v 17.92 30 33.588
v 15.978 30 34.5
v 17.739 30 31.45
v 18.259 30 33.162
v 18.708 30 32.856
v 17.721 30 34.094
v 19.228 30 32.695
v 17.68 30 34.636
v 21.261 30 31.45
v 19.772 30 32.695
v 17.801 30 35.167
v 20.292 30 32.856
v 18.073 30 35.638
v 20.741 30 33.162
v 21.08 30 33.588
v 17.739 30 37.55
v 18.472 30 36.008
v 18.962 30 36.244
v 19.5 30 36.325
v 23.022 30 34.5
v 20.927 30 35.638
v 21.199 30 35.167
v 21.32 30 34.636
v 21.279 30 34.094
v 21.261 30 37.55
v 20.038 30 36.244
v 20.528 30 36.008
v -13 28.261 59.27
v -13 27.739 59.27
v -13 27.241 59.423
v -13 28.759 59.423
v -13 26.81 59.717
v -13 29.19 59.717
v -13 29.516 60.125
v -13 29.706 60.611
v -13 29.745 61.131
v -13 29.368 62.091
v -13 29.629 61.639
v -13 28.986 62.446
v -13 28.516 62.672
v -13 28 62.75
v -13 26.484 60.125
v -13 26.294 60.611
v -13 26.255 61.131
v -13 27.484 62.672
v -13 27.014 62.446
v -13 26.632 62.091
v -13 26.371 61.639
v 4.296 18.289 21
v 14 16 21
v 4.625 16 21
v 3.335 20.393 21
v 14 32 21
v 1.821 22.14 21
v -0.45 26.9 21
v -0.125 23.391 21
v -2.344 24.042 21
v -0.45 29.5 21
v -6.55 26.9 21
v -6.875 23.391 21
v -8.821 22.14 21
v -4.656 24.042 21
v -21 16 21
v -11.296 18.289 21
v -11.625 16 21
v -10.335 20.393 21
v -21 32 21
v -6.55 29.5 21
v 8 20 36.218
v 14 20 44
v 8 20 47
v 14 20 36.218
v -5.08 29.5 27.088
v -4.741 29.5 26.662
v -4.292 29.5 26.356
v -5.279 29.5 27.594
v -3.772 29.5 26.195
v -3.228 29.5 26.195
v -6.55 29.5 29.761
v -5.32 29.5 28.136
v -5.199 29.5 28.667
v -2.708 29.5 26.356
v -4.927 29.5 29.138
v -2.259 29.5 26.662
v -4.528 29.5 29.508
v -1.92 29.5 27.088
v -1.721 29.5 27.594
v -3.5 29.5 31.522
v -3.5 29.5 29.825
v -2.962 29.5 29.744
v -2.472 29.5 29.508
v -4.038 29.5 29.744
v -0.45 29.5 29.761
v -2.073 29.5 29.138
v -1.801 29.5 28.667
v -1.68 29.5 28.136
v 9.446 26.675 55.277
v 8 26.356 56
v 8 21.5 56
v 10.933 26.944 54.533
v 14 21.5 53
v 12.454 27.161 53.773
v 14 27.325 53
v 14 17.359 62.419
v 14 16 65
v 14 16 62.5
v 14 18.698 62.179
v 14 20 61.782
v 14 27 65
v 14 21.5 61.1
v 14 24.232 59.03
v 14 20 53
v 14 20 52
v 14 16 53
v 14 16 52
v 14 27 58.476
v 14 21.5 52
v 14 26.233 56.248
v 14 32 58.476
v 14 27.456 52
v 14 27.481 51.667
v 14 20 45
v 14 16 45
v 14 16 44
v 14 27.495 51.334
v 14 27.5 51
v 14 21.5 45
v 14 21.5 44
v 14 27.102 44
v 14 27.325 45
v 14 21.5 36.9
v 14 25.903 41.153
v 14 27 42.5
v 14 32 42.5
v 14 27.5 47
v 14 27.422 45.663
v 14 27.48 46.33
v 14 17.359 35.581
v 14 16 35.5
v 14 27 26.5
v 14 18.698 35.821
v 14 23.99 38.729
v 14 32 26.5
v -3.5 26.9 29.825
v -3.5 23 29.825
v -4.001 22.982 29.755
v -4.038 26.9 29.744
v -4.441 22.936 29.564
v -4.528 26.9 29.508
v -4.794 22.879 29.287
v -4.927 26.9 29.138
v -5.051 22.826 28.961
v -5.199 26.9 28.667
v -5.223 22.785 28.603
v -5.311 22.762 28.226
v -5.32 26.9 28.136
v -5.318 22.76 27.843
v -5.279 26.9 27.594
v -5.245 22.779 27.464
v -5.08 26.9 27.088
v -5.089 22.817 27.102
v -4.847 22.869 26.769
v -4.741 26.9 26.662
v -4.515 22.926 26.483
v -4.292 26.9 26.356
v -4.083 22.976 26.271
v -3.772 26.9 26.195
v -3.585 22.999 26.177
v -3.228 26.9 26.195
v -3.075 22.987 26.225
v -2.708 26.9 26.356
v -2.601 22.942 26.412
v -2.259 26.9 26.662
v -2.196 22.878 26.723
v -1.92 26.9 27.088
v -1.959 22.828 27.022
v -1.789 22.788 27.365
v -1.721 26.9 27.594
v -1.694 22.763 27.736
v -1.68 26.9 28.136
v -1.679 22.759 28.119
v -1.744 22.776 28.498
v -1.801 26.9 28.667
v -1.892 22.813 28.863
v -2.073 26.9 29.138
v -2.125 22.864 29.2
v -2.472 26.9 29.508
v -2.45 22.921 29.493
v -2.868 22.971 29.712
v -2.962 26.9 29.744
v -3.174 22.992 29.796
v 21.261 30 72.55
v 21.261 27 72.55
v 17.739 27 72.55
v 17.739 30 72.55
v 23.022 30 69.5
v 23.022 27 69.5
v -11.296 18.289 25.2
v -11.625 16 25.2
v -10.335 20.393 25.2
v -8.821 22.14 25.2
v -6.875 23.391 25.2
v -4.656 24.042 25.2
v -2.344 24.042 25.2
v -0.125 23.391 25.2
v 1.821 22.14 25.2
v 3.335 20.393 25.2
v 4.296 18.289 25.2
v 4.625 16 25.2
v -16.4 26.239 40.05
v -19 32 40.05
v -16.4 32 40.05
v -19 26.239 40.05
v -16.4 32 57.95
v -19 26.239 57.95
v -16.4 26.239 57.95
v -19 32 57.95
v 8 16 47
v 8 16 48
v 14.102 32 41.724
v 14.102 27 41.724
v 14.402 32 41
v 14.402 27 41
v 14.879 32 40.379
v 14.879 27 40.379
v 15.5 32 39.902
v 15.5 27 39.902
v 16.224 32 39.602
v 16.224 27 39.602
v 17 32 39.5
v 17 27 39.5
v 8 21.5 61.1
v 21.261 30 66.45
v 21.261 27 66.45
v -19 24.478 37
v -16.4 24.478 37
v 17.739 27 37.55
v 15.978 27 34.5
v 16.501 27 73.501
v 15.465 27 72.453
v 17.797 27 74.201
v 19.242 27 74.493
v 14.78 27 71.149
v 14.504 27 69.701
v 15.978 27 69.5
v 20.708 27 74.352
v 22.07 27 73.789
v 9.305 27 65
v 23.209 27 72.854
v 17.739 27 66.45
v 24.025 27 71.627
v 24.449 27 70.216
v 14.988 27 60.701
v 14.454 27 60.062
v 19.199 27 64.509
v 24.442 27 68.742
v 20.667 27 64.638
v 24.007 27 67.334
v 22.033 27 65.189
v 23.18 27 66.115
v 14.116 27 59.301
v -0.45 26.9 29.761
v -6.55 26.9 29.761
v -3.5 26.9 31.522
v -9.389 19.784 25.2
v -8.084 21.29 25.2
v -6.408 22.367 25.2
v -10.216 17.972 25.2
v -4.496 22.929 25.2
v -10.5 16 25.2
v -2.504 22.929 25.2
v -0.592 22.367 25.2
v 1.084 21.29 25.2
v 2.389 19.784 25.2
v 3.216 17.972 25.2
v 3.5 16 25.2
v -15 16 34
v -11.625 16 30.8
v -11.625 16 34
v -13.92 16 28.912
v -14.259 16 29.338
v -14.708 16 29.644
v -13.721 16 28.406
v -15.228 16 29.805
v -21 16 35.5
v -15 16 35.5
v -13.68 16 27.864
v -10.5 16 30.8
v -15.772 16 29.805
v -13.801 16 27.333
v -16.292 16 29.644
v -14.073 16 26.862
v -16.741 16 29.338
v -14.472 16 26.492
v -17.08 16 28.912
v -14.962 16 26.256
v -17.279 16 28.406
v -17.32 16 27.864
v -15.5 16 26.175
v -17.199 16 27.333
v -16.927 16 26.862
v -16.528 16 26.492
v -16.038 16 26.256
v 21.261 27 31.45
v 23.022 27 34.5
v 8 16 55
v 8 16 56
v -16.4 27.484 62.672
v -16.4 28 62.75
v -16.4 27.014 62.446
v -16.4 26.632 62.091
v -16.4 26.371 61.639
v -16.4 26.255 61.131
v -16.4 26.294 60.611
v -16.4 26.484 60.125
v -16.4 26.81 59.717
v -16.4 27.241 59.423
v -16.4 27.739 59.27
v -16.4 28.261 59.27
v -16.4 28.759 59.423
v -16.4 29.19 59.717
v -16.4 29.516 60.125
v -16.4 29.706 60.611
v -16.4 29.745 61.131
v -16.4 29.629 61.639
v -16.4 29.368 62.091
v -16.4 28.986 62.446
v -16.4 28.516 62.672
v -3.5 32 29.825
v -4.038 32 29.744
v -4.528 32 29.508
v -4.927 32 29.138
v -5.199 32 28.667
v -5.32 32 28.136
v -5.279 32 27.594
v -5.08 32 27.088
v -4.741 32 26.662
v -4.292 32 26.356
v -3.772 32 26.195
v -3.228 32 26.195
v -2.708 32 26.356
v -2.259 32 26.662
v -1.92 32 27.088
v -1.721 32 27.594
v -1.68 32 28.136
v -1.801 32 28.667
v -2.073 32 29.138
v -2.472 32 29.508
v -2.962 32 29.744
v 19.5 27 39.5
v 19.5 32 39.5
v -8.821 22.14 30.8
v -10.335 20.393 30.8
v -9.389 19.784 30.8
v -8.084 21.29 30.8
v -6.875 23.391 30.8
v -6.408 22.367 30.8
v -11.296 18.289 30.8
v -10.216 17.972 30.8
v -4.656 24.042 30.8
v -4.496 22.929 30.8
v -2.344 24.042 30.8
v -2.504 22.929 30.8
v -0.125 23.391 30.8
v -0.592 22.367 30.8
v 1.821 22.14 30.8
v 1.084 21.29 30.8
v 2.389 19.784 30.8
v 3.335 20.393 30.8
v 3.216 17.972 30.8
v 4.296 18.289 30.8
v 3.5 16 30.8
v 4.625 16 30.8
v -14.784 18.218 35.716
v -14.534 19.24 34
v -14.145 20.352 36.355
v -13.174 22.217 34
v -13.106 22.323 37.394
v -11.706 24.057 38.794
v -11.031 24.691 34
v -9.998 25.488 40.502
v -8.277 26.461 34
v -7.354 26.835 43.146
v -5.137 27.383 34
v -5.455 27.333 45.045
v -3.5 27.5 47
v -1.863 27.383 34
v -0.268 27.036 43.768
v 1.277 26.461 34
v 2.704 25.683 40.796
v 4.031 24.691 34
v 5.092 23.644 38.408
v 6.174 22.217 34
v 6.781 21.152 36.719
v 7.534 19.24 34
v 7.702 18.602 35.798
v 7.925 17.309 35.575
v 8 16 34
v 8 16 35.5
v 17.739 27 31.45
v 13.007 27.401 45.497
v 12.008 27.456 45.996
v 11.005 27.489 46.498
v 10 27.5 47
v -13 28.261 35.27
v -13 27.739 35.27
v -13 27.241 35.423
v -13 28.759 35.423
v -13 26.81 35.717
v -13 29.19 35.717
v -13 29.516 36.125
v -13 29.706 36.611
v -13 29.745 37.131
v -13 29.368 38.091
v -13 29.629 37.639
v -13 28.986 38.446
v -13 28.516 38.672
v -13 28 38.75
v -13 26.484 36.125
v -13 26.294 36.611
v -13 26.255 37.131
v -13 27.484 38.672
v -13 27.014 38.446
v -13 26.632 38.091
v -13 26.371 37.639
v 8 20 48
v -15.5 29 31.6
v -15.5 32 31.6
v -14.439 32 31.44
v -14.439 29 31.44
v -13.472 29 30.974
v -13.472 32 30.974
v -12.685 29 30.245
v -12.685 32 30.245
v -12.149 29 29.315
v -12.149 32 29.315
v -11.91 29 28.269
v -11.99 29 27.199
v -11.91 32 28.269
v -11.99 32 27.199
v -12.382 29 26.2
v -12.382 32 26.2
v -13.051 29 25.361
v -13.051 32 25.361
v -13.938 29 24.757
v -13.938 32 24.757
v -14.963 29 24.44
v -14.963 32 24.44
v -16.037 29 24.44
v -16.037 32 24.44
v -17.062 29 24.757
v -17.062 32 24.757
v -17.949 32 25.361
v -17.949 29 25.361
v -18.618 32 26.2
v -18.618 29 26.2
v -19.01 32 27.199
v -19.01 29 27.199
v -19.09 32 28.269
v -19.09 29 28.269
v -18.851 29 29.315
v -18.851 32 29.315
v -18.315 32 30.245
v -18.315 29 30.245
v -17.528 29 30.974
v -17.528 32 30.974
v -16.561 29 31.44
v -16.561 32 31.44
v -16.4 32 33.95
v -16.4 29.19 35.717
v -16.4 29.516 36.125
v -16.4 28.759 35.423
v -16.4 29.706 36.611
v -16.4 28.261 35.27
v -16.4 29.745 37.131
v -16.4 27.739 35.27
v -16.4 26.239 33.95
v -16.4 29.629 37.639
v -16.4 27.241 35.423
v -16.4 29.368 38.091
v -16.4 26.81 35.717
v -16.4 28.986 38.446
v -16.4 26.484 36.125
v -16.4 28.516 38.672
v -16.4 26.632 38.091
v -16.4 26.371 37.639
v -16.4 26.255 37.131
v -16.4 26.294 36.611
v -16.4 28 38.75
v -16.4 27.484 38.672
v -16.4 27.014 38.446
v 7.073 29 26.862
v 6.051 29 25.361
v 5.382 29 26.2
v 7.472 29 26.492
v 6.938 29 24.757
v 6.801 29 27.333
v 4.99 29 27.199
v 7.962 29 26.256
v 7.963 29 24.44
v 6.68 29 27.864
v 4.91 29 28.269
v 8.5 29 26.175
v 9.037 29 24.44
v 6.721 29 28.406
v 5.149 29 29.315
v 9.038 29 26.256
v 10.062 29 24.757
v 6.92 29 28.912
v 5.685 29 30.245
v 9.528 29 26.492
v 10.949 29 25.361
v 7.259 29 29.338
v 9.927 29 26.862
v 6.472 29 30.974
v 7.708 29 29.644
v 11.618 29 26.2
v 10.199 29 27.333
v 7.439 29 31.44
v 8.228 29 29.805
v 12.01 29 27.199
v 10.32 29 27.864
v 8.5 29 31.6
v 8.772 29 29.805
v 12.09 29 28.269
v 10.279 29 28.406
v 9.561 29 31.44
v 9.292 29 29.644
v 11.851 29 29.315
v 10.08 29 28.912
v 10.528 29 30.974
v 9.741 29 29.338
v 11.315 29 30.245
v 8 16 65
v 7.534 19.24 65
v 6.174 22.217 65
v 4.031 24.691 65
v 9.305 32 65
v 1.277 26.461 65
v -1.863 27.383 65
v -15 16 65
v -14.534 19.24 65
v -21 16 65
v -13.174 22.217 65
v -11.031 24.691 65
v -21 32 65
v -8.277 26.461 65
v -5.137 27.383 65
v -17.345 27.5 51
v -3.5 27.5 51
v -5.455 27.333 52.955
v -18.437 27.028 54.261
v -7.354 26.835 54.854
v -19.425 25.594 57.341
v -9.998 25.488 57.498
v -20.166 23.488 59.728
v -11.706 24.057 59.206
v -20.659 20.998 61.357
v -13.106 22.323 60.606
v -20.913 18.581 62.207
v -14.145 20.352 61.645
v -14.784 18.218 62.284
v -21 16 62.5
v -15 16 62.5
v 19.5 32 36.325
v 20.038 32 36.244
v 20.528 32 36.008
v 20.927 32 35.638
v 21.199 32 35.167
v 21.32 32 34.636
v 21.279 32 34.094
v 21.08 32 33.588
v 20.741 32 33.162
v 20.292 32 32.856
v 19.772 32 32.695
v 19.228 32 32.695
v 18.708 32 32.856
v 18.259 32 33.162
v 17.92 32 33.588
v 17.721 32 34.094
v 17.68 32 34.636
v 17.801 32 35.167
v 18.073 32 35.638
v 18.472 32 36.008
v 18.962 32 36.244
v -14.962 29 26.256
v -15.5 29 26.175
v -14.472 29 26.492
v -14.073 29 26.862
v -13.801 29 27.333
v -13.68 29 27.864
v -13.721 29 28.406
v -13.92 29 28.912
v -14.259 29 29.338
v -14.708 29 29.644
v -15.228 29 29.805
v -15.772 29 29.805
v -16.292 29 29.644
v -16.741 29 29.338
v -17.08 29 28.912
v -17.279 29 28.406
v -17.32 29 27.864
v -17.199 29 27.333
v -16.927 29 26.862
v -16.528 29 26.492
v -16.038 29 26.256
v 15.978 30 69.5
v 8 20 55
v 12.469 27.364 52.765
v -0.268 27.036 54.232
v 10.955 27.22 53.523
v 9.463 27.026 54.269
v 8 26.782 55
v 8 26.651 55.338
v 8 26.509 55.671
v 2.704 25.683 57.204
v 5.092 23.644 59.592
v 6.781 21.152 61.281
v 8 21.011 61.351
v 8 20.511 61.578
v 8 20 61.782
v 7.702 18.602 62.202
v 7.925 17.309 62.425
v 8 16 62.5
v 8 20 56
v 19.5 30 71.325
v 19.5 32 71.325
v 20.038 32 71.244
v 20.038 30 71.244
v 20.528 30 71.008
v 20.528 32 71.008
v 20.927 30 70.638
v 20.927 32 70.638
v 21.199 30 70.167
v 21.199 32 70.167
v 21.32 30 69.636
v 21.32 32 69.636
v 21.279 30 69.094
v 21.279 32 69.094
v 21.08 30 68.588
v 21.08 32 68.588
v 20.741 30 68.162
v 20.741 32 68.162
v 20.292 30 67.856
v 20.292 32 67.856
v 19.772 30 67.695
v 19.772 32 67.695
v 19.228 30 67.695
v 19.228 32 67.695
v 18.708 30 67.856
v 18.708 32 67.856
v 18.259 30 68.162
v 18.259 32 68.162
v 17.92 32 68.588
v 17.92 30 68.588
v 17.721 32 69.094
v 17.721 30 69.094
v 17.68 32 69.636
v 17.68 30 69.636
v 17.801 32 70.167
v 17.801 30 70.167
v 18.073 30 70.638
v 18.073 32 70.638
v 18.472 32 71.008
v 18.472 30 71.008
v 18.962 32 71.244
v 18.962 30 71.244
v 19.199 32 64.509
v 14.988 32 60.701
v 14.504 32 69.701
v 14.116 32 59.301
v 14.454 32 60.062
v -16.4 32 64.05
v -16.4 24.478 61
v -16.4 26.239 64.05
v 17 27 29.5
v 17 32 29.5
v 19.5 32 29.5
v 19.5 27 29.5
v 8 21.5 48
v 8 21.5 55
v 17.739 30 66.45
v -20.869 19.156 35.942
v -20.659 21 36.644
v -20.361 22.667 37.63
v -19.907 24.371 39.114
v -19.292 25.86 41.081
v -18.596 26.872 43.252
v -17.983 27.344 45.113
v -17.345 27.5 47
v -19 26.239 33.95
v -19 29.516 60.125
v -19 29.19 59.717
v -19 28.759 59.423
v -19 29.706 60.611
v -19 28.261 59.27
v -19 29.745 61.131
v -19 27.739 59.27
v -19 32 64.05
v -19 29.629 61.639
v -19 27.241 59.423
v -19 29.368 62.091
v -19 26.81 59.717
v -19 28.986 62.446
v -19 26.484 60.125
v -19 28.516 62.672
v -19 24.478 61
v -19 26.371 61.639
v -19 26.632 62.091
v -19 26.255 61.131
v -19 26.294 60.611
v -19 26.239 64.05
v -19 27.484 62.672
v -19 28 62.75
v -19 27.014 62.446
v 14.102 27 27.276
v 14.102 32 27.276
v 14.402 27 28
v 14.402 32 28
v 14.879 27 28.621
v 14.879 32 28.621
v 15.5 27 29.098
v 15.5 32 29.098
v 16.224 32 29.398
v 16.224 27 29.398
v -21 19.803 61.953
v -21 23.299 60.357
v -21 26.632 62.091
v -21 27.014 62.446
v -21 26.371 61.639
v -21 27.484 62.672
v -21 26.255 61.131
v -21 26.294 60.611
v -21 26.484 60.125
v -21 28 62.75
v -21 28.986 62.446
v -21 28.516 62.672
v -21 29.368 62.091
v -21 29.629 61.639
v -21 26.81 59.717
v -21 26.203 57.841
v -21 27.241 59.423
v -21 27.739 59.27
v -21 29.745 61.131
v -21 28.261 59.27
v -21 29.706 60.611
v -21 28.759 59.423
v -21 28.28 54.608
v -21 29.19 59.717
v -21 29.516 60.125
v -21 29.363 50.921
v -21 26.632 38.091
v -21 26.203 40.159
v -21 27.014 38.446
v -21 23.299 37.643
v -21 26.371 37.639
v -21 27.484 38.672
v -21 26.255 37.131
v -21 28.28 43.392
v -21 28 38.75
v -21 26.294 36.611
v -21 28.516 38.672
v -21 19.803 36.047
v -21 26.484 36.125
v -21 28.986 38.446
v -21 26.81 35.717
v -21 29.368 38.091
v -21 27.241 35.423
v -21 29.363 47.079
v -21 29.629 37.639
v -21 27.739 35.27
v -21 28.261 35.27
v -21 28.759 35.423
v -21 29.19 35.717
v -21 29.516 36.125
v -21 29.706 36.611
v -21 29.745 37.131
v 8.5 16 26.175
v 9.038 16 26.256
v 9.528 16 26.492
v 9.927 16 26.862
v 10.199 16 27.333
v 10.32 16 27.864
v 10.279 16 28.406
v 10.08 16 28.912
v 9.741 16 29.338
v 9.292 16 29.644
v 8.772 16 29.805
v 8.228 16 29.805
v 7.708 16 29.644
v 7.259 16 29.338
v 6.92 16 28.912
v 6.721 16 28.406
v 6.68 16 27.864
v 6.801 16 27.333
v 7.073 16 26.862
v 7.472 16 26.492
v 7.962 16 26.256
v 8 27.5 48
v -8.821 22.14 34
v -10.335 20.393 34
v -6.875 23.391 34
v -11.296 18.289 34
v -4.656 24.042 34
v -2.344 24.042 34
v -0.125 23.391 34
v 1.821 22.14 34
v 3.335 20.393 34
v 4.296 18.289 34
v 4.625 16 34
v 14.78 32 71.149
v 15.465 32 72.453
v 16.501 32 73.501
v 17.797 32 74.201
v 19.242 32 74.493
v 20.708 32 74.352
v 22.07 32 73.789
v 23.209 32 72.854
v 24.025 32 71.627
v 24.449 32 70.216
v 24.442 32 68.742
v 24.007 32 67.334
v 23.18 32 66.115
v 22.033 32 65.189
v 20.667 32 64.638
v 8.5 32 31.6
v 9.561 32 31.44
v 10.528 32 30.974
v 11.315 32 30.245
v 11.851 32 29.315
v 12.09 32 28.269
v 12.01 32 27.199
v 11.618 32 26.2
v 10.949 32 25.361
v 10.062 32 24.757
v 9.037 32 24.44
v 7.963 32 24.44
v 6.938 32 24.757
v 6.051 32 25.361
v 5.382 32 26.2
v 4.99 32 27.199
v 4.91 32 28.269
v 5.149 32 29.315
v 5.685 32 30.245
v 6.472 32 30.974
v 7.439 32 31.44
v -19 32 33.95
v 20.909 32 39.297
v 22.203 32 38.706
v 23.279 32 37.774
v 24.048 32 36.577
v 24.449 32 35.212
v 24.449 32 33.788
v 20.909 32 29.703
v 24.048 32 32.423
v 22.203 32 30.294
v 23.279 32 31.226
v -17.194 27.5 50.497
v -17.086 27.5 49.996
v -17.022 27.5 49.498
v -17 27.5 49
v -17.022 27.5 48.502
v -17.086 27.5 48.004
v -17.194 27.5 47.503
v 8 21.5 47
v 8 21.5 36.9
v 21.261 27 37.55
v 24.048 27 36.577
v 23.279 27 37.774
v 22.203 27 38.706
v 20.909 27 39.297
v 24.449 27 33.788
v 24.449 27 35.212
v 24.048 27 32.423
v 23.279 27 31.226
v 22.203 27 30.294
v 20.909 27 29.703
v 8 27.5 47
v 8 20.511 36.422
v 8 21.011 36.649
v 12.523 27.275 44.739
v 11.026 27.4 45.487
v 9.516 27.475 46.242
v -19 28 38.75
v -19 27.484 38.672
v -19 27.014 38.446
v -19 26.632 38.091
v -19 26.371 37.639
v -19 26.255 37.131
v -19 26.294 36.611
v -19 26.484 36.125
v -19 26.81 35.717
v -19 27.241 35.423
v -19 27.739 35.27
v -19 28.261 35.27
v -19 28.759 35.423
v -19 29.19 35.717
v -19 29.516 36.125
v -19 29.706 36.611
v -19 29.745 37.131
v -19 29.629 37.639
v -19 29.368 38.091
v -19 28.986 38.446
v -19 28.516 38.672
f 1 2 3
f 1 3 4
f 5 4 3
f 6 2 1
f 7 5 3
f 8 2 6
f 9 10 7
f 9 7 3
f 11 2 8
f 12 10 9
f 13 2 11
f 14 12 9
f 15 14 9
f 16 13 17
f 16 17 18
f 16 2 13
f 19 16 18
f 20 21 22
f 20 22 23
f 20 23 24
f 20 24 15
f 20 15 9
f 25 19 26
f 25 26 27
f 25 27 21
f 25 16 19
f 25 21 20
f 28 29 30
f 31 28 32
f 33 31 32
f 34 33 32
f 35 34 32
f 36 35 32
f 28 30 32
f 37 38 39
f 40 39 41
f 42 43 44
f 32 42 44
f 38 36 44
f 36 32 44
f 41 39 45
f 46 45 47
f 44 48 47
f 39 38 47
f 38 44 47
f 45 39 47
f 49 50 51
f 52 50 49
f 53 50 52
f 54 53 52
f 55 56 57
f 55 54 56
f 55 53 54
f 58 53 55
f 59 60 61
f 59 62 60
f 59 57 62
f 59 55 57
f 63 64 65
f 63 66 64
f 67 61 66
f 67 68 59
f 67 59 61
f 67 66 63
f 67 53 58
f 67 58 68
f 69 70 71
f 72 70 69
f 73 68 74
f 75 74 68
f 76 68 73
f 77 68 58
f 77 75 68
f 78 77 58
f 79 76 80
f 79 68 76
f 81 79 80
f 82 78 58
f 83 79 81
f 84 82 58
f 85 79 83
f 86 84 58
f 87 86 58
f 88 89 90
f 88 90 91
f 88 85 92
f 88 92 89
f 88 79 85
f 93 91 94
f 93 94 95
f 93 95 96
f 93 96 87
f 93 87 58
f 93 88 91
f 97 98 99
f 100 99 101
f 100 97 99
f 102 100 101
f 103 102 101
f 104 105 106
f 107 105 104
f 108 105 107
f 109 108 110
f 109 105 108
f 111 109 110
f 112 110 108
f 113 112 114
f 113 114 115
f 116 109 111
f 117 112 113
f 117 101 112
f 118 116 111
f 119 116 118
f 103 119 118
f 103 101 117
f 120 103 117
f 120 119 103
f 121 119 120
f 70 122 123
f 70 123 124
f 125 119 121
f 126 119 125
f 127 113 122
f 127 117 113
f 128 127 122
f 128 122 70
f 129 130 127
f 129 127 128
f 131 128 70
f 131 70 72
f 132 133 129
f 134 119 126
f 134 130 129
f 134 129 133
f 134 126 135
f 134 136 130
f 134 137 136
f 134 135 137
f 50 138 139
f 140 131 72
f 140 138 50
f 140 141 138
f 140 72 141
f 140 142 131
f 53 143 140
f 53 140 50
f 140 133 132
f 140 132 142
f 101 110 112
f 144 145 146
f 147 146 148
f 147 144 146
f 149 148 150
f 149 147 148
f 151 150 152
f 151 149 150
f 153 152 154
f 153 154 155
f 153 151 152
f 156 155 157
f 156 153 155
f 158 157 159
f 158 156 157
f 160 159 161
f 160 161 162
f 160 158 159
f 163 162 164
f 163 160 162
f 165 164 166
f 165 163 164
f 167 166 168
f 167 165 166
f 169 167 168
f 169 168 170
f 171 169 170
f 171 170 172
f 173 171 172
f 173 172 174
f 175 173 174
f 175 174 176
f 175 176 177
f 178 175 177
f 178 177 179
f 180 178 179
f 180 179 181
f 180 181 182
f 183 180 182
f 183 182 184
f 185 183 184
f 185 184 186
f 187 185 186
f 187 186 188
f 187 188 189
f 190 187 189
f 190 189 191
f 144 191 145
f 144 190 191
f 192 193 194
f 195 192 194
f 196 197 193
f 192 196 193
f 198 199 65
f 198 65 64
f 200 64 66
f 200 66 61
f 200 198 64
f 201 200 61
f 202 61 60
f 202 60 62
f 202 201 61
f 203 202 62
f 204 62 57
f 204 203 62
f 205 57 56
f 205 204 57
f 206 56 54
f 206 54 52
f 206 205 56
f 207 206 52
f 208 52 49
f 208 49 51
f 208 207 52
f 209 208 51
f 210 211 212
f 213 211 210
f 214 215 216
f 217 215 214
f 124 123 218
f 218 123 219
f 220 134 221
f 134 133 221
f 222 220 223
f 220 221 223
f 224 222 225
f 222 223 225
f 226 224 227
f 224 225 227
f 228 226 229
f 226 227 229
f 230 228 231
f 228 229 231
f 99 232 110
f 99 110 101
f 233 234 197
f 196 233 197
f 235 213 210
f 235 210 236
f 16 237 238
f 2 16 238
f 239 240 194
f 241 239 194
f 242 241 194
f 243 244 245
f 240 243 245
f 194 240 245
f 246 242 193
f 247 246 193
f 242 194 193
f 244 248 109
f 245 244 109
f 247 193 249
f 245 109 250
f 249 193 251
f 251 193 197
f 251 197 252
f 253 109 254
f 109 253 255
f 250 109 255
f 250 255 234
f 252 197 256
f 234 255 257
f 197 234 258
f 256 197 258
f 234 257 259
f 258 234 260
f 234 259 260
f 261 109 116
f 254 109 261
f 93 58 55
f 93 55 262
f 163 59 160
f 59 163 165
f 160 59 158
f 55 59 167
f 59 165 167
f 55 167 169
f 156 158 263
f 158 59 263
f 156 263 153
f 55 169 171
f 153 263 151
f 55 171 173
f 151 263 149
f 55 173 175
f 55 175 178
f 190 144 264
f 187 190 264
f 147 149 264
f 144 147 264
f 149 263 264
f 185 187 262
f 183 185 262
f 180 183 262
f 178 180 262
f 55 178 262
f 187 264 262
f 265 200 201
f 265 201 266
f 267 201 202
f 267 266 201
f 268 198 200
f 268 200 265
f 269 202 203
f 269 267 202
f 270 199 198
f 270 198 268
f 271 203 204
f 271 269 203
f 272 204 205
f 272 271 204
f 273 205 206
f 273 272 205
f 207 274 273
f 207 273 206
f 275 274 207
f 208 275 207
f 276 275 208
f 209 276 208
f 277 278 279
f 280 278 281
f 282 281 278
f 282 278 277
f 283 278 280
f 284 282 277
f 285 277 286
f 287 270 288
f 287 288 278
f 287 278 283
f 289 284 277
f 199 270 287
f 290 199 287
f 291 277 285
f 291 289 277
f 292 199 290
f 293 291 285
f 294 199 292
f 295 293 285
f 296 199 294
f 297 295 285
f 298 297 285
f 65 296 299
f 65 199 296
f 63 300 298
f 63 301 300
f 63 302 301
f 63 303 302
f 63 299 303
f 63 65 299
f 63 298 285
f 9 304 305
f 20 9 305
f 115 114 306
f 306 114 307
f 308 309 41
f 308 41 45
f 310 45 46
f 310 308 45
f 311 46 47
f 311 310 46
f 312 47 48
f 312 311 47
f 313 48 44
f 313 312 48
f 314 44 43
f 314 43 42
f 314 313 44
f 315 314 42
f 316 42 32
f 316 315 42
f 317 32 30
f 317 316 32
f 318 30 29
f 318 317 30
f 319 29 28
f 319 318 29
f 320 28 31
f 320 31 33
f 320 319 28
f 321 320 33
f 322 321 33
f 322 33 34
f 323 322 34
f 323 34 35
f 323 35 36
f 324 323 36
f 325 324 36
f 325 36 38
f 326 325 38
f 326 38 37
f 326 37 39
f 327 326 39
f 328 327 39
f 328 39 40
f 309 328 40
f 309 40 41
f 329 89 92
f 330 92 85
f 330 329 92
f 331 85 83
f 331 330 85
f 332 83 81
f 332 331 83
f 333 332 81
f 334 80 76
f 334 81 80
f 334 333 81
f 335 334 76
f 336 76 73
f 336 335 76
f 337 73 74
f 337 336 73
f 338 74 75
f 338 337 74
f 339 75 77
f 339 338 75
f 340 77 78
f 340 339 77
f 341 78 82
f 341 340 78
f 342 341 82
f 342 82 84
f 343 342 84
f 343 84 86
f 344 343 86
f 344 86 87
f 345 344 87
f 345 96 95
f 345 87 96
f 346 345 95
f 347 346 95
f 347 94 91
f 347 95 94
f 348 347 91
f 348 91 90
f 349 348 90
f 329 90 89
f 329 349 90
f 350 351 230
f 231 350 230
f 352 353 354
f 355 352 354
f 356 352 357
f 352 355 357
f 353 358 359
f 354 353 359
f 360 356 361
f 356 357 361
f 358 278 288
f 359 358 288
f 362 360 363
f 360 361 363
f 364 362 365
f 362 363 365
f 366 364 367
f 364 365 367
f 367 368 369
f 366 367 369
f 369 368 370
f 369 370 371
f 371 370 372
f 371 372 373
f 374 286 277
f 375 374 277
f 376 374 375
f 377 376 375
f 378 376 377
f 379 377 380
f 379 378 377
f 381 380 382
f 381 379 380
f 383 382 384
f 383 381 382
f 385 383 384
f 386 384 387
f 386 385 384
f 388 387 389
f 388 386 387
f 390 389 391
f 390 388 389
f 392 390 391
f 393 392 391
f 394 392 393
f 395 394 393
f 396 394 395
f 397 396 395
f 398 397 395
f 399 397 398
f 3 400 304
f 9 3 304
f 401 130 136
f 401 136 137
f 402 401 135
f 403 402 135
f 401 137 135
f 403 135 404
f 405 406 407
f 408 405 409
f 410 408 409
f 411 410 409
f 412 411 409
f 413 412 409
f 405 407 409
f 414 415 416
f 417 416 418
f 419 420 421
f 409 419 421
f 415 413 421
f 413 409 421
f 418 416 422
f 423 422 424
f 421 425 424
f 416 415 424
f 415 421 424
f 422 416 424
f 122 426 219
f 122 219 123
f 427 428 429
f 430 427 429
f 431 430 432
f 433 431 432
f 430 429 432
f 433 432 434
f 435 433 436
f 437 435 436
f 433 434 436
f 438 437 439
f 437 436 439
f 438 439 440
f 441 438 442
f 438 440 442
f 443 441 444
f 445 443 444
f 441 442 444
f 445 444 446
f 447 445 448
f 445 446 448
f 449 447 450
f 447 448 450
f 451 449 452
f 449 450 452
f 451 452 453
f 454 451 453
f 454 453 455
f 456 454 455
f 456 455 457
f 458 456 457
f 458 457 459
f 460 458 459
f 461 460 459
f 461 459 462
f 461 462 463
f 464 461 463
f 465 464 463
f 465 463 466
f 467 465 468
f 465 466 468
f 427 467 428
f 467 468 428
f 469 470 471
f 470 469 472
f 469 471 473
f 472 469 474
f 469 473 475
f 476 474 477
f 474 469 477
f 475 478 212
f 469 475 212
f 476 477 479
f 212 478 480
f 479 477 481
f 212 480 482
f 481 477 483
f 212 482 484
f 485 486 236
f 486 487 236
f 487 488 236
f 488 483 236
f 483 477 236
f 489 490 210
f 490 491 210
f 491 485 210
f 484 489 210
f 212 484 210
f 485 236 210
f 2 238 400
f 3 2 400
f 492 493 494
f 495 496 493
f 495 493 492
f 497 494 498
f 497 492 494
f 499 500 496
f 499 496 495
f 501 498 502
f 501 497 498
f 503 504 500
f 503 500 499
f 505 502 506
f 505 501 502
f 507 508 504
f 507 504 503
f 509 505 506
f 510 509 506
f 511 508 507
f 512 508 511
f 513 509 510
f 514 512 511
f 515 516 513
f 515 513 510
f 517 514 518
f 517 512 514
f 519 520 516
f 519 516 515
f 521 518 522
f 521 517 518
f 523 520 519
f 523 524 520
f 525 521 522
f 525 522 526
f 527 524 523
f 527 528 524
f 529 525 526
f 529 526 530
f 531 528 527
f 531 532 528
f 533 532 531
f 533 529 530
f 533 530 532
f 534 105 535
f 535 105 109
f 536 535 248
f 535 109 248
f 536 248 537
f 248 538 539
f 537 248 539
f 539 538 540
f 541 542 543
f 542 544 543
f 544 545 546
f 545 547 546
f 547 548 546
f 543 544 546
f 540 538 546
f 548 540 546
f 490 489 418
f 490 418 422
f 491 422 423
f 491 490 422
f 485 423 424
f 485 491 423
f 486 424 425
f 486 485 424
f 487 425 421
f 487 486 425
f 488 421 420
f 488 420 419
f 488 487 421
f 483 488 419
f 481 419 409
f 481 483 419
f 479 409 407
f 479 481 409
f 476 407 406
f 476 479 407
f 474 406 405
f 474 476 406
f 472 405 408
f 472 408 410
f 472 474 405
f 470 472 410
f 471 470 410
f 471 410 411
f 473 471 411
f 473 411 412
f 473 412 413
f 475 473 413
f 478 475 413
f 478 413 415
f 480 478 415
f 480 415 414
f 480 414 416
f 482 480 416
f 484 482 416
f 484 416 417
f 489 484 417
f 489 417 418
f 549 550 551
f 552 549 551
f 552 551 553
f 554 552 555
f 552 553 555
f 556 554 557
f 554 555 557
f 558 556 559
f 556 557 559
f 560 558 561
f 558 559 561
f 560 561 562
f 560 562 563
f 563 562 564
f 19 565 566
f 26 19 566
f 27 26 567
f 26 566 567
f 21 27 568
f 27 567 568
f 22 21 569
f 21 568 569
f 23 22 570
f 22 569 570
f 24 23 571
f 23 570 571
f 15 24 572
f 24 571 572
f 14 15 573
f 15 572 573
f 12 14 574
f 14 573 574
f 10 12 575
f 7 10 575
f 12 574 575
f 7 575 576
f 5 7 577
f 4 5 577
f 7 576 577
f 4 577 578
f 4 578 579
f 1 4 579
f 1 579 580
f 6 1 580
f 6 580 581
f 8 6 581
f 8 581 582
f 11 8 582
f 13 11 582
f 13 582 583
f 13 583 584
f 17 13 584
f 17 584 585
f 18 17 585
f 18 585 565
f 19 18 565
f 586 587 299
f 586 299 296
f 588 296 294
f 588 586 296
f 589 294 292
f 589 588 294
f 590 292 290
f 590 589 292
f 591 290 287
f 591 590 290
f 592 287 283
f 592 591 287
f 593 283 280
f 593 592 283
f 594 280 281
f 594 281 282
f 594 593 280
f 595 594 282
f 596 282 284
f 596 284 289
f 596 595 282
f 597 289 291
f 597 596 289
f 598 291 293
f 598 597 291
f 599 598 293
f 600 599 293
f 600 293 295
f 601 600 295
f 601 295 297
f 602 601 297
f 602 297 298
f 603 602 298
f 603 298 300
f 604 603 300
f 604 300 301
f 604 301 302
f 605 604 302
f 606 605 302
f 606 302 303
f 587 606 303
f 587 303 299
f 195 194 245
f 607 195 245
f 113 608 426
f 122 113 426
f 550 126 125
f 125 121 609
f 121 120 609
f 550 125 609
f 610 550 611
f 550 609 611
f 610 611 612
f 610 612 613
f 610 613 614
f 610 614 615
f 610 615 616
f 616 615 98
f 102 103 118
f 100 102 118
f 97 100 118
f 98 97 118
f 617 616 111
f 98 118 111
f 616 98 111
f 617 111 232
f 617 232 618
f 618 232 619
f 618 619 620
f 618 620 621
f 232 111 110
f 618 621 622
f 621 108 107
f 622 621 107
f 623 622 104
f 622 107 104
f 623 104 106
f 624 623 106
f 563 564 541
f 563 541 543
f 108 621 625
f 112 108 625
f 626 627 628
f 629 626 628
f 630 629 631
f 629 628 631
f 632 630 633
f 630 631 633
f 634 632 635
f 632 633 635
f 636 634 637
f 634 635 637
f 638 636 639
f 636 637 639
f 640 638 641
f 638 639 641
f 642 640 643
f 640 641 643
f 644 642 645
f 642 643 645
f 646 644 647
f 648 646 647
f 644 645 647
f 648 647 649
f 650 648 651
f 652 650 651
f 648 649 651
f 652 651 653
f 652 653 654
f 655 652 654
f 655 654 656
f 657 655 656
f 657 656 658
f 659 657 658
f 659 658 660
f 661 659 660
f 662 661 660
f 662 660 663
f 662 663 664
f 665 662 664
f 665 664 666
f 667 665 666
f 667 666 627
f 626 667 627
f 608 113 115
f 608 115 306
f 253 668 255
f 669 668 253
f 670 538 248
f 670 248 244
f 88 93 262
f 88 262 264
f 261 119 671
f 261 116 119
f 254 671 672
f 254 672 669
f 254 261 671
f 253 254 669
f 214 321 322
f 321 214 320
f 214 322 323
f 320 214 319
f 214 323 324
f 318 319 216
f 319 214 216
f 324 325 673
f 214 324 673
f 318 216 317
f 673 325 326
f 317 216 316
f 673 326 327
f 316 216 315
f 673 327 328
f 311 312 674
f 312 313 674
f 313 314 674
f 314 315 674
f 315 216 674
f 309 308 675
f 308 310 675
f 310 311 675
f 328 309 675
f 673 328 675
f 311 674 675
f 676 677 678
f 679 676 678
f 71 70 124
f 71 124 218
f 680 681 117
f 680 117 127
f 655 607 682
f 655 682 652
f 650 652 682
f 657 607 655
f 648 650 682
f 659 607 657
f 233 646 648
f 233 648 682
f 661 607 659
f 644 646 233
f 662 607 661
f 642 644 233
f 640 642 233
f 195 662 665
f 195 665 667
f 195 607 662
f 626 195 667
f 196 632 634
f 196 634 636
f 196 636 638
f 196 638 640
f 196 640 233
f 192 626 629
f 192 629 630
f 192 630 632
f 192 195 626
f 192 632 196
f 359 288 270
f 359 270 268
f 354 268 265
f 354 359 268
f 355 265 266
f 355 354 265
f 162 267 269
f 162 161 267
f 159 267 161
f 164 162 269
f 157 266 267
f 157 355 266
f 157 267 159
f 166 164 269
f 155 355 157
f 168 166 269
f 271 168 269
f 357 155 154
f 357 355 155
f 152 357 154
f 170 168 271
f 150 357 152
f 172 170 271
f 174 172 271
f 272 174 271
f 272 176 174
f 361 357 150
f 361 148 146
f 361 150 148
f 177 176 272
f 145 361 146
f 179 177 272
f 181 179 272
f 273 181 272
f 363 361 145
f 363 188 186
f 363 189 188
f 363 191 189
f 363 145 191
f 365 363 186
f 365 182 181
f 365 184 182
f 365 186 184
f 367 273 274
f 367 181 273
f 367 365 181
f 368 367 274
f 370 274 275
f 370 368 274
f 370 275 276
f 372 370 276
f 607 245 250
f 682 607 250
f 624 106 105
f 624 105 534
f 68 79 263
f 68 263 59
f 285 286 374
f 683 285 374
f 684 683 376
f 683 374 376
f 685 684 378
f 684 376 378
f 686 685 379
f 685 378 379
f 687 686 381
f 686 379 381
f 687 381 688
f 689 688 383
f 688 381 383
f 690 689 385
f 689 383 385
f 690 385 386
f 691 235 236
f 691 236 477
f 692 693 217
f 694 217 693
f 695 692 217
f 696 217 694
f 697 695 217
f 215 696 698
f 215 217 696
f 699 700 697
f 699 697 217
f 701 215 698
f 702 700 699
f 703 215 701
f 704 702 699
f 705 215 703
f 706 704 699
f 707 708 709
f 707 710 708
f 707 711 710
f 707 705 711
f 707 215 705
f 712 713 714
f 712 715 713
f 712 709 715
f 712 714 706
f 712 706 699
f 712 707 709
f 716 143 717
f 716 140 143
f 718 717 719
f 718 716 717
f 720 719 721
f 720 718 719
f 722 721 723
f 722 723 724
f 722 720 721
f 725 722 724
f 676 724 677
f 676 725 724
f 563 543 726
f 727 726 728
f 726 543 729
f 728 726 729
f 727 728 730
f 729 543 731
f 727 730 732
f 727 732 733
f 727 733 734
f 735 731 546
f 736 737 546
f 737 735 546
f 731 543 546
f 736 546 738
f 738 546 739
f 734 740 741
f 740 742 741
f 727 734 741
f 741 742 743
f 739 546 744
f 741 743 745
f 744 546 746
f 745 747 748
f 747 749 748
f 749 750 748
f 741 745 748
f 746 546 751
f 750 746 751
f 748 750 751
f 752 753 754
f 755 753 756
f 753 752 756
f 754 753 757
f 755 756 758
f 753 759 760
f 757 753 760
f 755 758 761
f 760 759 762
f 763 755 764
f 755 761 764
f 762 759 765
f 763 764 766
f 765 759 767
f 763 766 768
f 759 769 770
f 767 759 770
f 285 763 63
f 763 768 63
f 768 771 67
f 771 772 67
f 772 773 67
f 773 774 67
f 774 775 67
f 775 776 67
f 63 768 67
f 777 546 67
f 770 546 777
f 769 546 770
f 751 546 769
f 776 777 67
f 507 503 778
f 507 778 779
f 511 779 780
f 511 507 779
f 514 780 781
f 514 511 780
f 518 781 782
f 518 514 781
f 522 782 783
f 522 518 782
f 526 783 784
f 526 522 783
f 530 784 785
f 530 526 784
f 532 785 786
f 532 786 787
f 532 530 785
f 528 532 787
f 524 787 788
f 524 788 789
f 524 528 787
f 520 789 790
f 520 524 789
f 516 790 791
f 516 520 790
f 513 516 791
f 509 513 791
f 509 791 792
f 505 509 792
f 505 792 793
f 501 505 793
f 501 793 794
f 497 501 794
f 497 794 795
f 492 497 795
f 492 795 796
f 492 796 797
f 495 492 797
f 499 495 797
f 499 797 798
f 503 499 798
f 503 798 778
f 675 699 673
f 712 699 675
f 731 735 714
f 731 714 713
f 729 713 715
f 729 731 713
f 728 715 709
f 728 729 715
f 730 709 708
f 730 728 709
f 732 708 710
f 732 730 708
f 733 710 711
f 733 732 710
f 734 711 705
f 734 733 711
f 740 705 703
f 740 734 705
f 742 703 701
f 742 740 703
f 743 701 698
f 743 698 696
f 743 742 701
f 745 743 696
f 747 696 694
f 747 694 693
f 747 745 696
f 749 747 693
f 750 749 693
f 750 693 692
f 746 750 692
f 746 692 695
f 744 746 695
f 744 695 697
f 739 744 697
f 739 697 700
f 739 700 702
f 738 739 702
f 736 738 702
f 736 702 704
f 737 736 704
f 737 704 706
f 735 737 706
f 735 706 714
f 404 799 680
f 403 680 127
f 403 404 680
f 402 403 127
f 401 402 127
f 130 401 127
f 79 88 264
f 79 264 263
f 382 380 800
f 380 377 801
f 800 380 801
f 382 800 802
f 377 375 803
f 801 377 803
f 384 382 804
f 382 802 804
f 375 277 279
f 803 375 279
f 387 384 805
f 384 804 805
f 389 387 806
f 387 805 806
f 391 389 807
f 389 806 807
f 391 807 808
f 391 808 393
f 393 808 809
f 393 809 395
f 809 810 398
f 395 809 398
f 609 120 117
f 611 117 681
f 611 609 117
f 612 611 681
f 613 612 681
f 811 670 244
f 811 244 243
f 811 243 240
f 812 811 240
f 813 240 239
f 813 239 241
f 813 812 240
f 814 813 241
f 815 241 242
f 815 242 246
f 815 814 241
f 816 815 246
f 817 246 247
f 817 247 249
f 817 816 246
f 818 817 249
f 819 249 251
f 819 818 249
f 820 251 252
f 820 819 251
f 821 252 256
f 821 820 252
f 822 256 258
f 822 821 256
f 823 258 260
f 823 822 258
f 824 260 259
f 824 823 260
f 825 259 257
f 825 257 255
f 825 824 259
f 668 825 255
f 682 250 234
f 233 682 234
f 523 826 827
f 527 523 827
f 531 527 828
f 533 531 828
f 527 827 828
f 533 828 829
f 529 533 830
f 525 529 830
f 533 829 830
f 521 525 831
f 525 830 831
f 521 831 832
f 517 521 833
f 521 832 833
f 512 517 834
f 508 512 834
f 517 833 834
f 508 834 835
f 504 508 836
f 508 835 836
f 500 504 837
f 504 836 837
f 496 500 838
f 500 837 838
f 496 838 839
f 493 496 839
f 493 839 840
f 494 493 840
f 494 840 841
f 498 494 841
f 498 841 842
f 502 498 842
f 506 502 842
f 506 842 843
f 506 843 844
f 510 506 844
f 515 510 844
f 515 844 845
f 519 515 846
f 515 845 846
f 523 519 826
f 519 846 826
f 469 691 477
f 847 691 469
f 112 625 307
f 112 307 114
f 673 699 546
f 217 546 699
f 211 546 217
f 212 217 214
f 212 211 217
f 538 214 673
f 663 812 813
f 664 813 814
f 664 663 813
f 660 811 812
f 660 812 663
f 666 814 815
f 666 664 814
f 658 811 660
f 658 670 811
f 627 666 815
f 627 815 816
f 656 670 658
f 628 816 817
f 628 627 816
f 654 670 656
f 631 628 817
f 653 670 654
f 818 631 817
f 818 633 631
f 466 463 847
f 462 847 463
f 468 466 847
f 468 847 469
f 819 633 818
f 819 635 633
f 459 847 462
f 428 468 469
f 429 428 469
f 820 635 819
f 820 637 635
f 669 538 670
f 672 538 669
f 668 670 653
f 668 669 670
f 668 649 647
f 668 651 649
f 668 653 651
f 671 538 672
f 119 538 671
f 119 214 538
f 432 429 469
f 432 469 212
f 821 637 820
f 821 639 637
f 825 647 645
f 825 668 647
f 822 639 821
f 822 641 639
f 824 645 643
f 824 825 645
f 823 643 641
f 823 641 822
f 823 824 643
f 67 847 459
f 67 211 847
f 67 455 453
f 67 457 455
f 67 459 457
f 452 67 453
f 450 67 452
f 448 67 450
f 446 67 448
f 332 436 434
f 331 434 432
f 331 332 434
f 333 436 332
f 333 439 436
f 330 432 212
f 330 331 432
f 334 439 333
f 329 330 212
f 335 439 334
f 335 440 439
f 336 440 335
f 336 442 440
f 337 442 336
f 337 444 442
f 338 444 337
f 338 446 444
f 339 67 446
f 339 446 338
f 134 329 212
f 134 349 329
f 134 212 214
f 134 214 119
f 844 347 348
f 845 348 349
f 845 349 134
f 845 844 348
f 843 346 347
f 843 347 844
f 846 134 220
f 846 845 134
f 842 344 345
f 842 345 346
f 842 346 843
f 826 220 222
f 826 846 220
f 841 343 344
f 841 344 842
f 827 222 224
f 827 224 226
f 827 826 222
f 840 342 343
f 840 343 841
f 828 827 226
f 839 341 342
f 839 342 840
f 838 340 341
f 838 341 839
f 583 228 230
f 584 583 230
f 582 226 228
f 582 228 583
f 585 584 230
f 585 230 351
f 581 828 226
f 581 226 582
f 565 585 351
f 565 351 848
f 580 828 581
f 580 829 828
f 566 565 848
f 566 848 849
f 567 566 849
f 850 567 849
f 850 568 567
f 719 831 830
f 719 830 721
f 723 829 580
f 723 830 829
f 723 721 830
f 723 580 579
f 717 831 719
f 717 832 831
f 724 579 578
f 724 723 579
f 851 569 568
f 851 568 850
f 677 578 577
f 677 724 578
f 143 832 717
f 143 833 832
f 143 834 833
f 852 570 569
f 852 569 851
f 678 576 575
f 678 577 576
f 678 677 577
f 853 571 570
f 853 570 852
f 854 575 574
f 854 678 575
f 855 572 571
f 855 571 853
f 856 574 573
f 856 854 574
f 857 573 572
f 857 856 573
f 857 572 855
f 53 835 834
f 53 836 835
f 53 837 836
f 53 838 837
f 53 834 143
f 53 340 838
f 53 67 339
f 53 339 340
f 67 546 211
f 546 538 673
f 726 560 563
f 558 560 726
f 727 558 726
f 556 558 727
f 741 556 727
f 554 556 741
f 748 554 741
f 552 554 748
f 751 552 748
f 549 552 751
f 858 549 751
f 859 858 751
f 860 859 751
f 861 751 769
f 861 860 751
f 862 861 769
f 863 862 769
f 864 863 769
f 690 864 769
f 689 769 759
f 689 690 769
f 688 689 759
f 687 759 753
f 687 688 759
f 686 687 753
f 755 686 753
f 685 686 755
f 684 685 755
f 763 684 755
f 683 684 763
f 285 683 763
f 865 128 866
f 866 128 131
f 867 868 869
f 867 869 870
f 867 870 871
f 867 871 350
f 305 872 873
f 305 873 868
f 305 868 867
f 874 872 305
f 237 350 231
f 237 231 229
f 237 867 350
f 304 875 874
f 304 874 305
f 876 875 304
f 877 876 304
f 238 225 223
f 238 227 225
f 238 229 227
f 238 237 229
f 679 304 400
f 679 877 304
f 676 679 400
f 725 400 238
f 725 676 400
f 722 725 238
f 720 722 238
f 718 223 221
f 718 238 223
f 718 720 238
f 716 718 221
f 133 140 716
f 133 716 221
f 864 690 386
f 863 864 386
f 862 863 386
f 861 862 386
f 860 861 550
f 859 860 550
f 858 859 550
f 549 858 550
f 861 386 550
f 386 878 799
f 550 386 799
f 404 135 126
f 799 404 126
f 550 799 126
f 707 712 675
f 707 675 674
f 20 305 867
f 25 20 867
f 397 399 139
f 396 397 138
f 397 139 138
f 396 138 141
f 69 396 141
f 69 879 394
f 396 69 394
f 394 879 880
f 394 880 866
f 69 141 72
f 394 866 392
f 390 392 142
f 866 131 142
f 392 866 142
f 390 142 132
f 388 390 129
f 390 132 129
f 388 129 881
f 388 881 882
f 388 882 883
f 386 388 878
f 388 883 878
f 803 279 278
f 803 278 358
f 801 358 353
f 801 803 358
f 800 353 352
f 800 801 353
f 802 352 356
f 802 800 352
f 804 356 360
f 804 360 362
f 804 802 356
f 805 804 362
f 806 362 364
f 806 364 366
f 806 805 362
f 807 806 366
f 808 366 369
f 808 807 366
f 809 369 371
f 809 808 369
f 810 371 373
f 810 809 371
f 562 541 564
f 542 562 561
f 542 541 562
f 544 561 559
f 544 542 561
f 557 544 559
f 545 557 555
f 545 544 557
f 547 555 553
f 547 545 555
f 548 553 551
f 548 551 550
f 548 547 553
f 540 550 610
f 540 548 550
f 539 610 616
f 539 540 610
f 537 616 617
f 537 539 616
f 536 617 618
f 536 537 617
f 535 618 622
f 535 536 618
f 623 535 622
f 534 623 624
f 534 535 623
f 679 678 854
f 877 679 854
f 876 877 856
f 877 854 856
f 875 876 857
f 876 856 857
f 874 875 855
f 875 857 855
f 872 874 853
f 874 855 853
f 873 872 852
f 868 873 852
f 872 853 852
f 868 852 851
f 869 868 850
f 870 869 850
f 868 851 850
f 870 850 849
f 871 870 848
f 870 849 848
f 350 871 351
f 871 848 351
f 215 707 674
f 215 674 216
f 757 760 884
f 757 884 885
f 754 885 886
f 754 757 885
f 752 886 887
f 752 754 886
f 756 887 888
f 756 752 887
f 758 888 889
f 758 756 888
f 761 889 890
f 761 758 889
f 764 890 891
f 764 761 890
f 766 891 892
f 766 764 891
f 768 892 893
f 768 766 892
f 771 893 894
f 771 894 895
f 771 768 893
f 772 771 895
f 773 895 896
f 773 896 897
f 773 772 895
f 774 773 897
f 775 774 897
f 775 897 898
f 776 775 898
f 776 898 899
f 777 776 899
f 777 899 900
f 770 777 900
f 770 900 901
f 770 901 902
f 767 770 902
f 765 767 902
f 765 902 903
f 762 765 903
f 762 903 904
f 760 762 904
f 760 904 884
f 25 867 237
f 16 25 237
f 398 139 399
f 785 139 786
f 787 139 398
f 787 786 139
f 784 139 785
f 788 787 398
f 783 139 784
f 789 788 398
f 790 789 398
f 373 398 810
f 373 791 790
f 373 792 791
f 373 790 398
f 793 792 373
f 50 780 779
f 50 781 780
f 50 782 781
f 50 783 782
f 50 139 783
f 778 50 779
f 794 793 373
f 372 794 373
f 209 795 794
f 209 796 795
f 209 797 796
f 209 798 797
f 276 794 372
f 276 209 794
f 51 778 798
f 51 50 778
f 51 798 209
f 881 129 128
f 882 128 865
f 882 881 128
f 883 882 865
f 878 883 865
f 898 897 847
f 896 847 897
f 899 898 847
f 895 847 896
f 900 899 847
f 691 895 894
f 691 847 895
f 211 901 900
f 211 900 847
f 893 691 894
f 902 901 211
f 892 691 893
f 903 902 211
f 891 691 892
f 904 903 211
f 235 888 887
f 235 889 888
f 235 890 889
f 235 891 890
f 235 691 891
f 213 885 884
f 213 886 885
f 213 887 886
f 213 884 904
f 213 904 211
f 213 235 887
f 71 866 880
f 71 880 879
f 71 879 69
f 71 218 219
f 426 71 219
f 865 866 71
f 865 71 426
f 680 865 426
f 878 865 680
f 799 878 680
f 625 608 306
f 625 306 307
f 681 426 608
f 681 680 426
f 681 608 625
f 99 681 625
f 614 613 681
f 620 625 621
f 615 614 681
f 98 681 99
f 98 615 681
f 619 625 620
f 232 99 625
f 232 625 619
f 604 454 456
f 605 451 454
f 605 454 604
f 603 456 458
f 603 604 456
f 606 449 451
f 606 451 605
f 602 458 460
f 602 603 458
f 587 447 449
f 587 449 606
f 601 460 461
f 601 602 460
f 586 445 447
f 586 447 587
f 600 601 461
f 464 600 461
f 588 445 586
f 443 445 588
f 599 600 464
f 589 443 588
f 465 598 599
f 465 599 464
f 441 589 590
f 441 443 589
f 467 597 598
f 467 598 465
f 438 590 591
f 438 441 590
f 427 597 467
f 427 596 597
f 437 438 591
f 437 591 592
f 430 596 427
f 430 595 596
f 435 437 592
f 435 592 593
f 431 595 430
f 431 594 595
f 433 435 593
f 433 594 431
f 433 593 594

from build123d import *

# Parameters (mm, degrees)
SKETCH12_W                = 35
SKETCH12_H                = 44
CHAMBER_DEPTH             = 16
SKETCH13_R                = 11.5
BODY_DEPTH                = 31
HOT_END_TONEL_DEPTH       = 76.538069872
SKETCH26_W                = 27
SKETCH26_H                = 1.5
GRID_V_DEPTH              = 6
GRID_H_DEPTH              = 16
SKETCH16_R                = 13.5
SKETCH18_R                = 11.5
SKETCH20_R                = 8.125
HOT_END_1_DEPTH           = 3.2
SKETCH21_R                = 7
HOT_END_2_DEPTH           = 5.6
SKETCH22_R                = 8.125
HOT_END_3_DEPTH           = 4.2
SKETCH24_R                = 1.825
MOUNT_HOLES_DEPTH         = 71.156967099
SKETCH25_R                = 1.75
FAN_MOUNT_HOLES_DEPTH     = 8
FAN_MOUNT_NUT_HOLES_START = -2
FAN_MOUNT_NUT_HOLES_DEPTH = 2.6
SKETCH32_R                = 1.825
HOT_END_SCREW_HOLE_DEPTH  = 20
HOT_END_NUT_HOLE_START    = 2.5
HOT_END_NUT_HOLE_DEPTH    = 2.6
SKETCH35_R                = 1.825
BOSS_EXTRUDE1_DEPTH       = 5
CUT_EXTRUDE5_DEPTH        = 3
SKETCH37_R                = 3.6
CUT_EXTRUDE6_DEPTH        = 3
FILLET1_R                 = 3


with BuildPart() as part:
    # Sketch12 → chamber (new body)
    with BuildSketch(Plane(origin=(0, 0, 0), x_dir=(-1, 0, 0), z_dir=(0, -1, 0))):
        with Locations((3.5, -43)):
            Rectangle(SKETCH12_W, SKETCH12_H)
    extrude(amount=-CHAMBER_DEPTH)

    # Sketch13 → body (cut)
    with BuildSketch(Plane.XY.offset(65)):
        with Locations((-3.5, 16)):
            Circle(SKETCH13_R)
    extrude(amount=-BODY_DEPTH, mode=Mode.SUBTRACT)

    # Sketch14 → hot-end-tonel (cut, through all)
    with BuildSketch(Plane(origin=(14, 0, 0), x_dir=(0, 0, -1), z_dir=(1, 0, 0))):
        with BuildLine():
            Line((-51, 27.5), (-47, 27.5))
            ThreePointArc((-47, 27.5), (-35.5, 16), (-47, 4.5))
            Line((-47, 4.5), (-51, 4.5))
            ThreePointArc((-51, 4.5), (-62.5, 16), (-51, 27.5))
        make_face()
    extrude(amount=-HOT_END_TONEL_DEPTH, mode=Mode.SUBTRACT)

    # Sketch26 → grid-v (add)
    with BuildSketch(Plane(origin=(14, 0, 0), x_dir=(0, 0, -1), z_dir=(1, 0, 0))):
        with Locations((-49, 11.25)):
            Rectangle(SKETCH26_W, SKETCH26_H)
    extrude(amount=-GRID_V_DEPTH)

    # Sketch27 → grid-h (add)
    with BuildSketch(Plane.XZ):
        Polygon((8, 56), (14, 53), (14, 52), (8, 55), align=None)
        Polygon((14, 44), (8, 47), (8, 48), (14, 45), align=None)
    extrude(amount=-GRID_H_DEPTH)

    # Sketch16 → Cut-Loft1 section 0
    with BuildSketch(Plane(origin=(-21, 0, 0), x_dir=(0, 0, -1), z_dir=(1, 0, 0))):
        with Locations((-49, 16)):
            Circle(SKETCH16_R)
    # Sketch18 → Cut-Loft1 section 1
    with BuildSketch(Plane.ZY.offset(17)):
        with Locations((49, 16)):
            Circle(SKETCH18_R)
    loft(mode=Mode.SUBTRACT)

    # Sketch20 → hot-end-1 (cut)
    with BuildSketch(Plane.XY.offset(34)):
        with Locations((-3.5, 16)):
            Circle(SKETCH20_R)
    extrude(amount=-HOT_END_1_DEPTH, mode=Mode.SUBTRACT)

    # Sketch21 → hot-end-2 (cut)
    with BuildSketch(Plane.XY.offset(30.8)):
        with Locations((-3.5, 16)):
            Circle(SKETCH21_R)
    extrude(amount=-HOT_END_2_DEPTH, mode=Mode.SUBTRACT)

    # Sketch22 → hot-end-3 (cut)
    with BuildSketch(Plane.XY.offset(25.2)):
        with Locations((-3.5, 16)):
            Circle(SKETCH22_R)
    extrude(amount=-HOT_END_3_DEPTH, mode=Mode.SUBTRACT)

    # Sketch24 → mount-holes (cut, through all)
    with BuildSketch(Plane.XZ):
        with Locations((-15.5, 28)):
            Circle(SKETCH24_R)
        with Locations((8.5, 28)):
            Circle(SKETCH24_R)
    extrude(amount=-MOUNT_HOLES_DEPTH, mode=Mode.SUBTRACT)

    # Sketch25 → fan-mount-holes (cut)
    with BuildSketch(Plane.ZY.offset(21)):
        with Locations((60.999999795, 4)):
            Circle(SKETCH25_R)
        with Locations((36.999999795, 4)):
            Circle(SKETCH25_R)
    extrude(amount=-FAN_MOUNT_HOLES_DEPTH, mode=Mode.SUBTRACT)

    # Sketch34 → fan-mount-nut-holes (cut)
    with BuildSketch(Plane.ZY.offset(21).offset(FAN_MOUNT_NUT_HOLES_START)):
        Polygon((33.949999795, 0), (40.049999795, 0), (40.049999795, 5.760918321), (36.999999795, 7.521836642), (33.949999795, 5.760918321), align=None)
        Polygon((64.049999795, 0), (64.049999795, 5.760918321), (60.999999795, 7.521836642), (57.949999795, 5.760918321), (57.949999795, 0), align=None)
    extrude(amount=-FAN_MOUNT_NUT_HOLES_DEPTH, mode=Mode.SUBTRACT)


with BuildPart() as body_2:
    # Mirror1: mirrored copy
    add(part.part.mirror(Plane.ZX.offset(16)))

    # Sketch32 → hot-end-screw-hole (cut)
    with BuildSketch(Plane(origin=(0, 32, 0), x_dir=(-1, 0, 0), z_dir=(0, -1, 0))):
        with Locations((3.5, -28)):
            Circle(SKETCH32_R)
    extrude(amount=HOT_END_SCREW_HOLE_DEPTH, mode=Mode.SUBTRACT)

    # Sketch33 → hot-end-nut-hole (cut)
    with BuildSketch(Plane.XZ.offset(-32).offset(HOT_END_NUT_HOLE_START)):
        Polygon((-6.55, 21), (-0.45, 21), (-0.45, 29.760918321), (-3.5, 31.521836642), (-6.55, 29.760918321), align=None)
    extrude(amount=HOT_END_NUT_HOLE_DEPTH, mode=Mode.SUBTRACT)

    # Sketch35 → Boss-Extrude1 (add)
    # profile 1 of 2: a face of its own
    with BuildSketch(Plane(origin=(0, 32, 0), x_dir=(1, 0, 0), z_dir=(0, 1, 0))):
        with BuildLine():
            Line((9.305077899, -65), (14.504047822, -69.701151268))
            ThreePointArc((14.504047822, -69.701151268), (23.208629379, -72.853515786), (19.198969923, -64.509070137))
            Line((19.198969923, -64.509070137), (14, -59.807918869))
            Line((14, -59.807918869), (9.305077899, -65))
        make_face()
        with Locations((19.5, -69.5)):
            Circle(SKETCH35_R, mode=Mode.SUBTRACT)
    # profile 2 of 2: a face of its own
    with BuildSketch(Plane(origin=(0, 32, 0), x_dir=(1, 0, 0), z_dir=(0, 1, 0))):
        with BuildLine():
            Line((14, -39.5), (14, -29.5))
            Line((14, -29.5), (19.5, -29.5))
            ThreePointArc((19.5, -29.5), (24.5, -34.5), (19.5, -39.5))
            Line((19.5, -39.5), (14, -39.5))
        make_face()
        with Locations((19.5, -34.5)):
            Circle(SKETCH35_R, mode=Mode.SUBTRACT)
    extrude(amount=-BOSS_EXTRUDE1_DEPTH)

    # Sketch36 → Cut-Extrude5 (cut)
    with BuildSketch(Plane.XZ.offset(-27)):
        Polygon((17.739081679, 31.45), (21.260918321, 31.45), (23.021836642, 34.5), (21.260918321, 37.55), (17.739081679, 37.55), (15.978163358, 34.5), align=None)
        Polygon((23.021836642, 69.5), (21.260918321, 72.55), (17.739081679, 72.55), (15.978163358, 69.5), (17.739081679, 66.45), (21.260918321, 66.45), align=None)
    extrude(amount=-CUT_EXTRUDE5_DEPTH, mode=Mode.SUBTRACT)

    # Sketch37 → Cut-Extrude6 (cut)
    with BuildSketch(Plane(origin=(0, 32, 0), x_dir=(1, 0, 0), z_dir=(0, 1, 0))):
        with Locations((-15.5, -28)):
            Circle(SKETCH37_R)
        with Locations((8.5, -28)):
            Circle(SKETCH37_R)
    extrude(amount=-CUT_EXTRUDE6_DEPTH, mode=Mode.SUBTRACT)

    # Fillet1
    fillet1_edges = [body_2.edges().sort_by_distance(p)[0] for p in [
        (14, 29.5, 59.807918869),
        (14, 29.5, 29.5),
        (14, 29.5, 39.5),
    ]]
    fillet(fillet1_edges, radius=FILLET1_R)


solid = body_2.part
